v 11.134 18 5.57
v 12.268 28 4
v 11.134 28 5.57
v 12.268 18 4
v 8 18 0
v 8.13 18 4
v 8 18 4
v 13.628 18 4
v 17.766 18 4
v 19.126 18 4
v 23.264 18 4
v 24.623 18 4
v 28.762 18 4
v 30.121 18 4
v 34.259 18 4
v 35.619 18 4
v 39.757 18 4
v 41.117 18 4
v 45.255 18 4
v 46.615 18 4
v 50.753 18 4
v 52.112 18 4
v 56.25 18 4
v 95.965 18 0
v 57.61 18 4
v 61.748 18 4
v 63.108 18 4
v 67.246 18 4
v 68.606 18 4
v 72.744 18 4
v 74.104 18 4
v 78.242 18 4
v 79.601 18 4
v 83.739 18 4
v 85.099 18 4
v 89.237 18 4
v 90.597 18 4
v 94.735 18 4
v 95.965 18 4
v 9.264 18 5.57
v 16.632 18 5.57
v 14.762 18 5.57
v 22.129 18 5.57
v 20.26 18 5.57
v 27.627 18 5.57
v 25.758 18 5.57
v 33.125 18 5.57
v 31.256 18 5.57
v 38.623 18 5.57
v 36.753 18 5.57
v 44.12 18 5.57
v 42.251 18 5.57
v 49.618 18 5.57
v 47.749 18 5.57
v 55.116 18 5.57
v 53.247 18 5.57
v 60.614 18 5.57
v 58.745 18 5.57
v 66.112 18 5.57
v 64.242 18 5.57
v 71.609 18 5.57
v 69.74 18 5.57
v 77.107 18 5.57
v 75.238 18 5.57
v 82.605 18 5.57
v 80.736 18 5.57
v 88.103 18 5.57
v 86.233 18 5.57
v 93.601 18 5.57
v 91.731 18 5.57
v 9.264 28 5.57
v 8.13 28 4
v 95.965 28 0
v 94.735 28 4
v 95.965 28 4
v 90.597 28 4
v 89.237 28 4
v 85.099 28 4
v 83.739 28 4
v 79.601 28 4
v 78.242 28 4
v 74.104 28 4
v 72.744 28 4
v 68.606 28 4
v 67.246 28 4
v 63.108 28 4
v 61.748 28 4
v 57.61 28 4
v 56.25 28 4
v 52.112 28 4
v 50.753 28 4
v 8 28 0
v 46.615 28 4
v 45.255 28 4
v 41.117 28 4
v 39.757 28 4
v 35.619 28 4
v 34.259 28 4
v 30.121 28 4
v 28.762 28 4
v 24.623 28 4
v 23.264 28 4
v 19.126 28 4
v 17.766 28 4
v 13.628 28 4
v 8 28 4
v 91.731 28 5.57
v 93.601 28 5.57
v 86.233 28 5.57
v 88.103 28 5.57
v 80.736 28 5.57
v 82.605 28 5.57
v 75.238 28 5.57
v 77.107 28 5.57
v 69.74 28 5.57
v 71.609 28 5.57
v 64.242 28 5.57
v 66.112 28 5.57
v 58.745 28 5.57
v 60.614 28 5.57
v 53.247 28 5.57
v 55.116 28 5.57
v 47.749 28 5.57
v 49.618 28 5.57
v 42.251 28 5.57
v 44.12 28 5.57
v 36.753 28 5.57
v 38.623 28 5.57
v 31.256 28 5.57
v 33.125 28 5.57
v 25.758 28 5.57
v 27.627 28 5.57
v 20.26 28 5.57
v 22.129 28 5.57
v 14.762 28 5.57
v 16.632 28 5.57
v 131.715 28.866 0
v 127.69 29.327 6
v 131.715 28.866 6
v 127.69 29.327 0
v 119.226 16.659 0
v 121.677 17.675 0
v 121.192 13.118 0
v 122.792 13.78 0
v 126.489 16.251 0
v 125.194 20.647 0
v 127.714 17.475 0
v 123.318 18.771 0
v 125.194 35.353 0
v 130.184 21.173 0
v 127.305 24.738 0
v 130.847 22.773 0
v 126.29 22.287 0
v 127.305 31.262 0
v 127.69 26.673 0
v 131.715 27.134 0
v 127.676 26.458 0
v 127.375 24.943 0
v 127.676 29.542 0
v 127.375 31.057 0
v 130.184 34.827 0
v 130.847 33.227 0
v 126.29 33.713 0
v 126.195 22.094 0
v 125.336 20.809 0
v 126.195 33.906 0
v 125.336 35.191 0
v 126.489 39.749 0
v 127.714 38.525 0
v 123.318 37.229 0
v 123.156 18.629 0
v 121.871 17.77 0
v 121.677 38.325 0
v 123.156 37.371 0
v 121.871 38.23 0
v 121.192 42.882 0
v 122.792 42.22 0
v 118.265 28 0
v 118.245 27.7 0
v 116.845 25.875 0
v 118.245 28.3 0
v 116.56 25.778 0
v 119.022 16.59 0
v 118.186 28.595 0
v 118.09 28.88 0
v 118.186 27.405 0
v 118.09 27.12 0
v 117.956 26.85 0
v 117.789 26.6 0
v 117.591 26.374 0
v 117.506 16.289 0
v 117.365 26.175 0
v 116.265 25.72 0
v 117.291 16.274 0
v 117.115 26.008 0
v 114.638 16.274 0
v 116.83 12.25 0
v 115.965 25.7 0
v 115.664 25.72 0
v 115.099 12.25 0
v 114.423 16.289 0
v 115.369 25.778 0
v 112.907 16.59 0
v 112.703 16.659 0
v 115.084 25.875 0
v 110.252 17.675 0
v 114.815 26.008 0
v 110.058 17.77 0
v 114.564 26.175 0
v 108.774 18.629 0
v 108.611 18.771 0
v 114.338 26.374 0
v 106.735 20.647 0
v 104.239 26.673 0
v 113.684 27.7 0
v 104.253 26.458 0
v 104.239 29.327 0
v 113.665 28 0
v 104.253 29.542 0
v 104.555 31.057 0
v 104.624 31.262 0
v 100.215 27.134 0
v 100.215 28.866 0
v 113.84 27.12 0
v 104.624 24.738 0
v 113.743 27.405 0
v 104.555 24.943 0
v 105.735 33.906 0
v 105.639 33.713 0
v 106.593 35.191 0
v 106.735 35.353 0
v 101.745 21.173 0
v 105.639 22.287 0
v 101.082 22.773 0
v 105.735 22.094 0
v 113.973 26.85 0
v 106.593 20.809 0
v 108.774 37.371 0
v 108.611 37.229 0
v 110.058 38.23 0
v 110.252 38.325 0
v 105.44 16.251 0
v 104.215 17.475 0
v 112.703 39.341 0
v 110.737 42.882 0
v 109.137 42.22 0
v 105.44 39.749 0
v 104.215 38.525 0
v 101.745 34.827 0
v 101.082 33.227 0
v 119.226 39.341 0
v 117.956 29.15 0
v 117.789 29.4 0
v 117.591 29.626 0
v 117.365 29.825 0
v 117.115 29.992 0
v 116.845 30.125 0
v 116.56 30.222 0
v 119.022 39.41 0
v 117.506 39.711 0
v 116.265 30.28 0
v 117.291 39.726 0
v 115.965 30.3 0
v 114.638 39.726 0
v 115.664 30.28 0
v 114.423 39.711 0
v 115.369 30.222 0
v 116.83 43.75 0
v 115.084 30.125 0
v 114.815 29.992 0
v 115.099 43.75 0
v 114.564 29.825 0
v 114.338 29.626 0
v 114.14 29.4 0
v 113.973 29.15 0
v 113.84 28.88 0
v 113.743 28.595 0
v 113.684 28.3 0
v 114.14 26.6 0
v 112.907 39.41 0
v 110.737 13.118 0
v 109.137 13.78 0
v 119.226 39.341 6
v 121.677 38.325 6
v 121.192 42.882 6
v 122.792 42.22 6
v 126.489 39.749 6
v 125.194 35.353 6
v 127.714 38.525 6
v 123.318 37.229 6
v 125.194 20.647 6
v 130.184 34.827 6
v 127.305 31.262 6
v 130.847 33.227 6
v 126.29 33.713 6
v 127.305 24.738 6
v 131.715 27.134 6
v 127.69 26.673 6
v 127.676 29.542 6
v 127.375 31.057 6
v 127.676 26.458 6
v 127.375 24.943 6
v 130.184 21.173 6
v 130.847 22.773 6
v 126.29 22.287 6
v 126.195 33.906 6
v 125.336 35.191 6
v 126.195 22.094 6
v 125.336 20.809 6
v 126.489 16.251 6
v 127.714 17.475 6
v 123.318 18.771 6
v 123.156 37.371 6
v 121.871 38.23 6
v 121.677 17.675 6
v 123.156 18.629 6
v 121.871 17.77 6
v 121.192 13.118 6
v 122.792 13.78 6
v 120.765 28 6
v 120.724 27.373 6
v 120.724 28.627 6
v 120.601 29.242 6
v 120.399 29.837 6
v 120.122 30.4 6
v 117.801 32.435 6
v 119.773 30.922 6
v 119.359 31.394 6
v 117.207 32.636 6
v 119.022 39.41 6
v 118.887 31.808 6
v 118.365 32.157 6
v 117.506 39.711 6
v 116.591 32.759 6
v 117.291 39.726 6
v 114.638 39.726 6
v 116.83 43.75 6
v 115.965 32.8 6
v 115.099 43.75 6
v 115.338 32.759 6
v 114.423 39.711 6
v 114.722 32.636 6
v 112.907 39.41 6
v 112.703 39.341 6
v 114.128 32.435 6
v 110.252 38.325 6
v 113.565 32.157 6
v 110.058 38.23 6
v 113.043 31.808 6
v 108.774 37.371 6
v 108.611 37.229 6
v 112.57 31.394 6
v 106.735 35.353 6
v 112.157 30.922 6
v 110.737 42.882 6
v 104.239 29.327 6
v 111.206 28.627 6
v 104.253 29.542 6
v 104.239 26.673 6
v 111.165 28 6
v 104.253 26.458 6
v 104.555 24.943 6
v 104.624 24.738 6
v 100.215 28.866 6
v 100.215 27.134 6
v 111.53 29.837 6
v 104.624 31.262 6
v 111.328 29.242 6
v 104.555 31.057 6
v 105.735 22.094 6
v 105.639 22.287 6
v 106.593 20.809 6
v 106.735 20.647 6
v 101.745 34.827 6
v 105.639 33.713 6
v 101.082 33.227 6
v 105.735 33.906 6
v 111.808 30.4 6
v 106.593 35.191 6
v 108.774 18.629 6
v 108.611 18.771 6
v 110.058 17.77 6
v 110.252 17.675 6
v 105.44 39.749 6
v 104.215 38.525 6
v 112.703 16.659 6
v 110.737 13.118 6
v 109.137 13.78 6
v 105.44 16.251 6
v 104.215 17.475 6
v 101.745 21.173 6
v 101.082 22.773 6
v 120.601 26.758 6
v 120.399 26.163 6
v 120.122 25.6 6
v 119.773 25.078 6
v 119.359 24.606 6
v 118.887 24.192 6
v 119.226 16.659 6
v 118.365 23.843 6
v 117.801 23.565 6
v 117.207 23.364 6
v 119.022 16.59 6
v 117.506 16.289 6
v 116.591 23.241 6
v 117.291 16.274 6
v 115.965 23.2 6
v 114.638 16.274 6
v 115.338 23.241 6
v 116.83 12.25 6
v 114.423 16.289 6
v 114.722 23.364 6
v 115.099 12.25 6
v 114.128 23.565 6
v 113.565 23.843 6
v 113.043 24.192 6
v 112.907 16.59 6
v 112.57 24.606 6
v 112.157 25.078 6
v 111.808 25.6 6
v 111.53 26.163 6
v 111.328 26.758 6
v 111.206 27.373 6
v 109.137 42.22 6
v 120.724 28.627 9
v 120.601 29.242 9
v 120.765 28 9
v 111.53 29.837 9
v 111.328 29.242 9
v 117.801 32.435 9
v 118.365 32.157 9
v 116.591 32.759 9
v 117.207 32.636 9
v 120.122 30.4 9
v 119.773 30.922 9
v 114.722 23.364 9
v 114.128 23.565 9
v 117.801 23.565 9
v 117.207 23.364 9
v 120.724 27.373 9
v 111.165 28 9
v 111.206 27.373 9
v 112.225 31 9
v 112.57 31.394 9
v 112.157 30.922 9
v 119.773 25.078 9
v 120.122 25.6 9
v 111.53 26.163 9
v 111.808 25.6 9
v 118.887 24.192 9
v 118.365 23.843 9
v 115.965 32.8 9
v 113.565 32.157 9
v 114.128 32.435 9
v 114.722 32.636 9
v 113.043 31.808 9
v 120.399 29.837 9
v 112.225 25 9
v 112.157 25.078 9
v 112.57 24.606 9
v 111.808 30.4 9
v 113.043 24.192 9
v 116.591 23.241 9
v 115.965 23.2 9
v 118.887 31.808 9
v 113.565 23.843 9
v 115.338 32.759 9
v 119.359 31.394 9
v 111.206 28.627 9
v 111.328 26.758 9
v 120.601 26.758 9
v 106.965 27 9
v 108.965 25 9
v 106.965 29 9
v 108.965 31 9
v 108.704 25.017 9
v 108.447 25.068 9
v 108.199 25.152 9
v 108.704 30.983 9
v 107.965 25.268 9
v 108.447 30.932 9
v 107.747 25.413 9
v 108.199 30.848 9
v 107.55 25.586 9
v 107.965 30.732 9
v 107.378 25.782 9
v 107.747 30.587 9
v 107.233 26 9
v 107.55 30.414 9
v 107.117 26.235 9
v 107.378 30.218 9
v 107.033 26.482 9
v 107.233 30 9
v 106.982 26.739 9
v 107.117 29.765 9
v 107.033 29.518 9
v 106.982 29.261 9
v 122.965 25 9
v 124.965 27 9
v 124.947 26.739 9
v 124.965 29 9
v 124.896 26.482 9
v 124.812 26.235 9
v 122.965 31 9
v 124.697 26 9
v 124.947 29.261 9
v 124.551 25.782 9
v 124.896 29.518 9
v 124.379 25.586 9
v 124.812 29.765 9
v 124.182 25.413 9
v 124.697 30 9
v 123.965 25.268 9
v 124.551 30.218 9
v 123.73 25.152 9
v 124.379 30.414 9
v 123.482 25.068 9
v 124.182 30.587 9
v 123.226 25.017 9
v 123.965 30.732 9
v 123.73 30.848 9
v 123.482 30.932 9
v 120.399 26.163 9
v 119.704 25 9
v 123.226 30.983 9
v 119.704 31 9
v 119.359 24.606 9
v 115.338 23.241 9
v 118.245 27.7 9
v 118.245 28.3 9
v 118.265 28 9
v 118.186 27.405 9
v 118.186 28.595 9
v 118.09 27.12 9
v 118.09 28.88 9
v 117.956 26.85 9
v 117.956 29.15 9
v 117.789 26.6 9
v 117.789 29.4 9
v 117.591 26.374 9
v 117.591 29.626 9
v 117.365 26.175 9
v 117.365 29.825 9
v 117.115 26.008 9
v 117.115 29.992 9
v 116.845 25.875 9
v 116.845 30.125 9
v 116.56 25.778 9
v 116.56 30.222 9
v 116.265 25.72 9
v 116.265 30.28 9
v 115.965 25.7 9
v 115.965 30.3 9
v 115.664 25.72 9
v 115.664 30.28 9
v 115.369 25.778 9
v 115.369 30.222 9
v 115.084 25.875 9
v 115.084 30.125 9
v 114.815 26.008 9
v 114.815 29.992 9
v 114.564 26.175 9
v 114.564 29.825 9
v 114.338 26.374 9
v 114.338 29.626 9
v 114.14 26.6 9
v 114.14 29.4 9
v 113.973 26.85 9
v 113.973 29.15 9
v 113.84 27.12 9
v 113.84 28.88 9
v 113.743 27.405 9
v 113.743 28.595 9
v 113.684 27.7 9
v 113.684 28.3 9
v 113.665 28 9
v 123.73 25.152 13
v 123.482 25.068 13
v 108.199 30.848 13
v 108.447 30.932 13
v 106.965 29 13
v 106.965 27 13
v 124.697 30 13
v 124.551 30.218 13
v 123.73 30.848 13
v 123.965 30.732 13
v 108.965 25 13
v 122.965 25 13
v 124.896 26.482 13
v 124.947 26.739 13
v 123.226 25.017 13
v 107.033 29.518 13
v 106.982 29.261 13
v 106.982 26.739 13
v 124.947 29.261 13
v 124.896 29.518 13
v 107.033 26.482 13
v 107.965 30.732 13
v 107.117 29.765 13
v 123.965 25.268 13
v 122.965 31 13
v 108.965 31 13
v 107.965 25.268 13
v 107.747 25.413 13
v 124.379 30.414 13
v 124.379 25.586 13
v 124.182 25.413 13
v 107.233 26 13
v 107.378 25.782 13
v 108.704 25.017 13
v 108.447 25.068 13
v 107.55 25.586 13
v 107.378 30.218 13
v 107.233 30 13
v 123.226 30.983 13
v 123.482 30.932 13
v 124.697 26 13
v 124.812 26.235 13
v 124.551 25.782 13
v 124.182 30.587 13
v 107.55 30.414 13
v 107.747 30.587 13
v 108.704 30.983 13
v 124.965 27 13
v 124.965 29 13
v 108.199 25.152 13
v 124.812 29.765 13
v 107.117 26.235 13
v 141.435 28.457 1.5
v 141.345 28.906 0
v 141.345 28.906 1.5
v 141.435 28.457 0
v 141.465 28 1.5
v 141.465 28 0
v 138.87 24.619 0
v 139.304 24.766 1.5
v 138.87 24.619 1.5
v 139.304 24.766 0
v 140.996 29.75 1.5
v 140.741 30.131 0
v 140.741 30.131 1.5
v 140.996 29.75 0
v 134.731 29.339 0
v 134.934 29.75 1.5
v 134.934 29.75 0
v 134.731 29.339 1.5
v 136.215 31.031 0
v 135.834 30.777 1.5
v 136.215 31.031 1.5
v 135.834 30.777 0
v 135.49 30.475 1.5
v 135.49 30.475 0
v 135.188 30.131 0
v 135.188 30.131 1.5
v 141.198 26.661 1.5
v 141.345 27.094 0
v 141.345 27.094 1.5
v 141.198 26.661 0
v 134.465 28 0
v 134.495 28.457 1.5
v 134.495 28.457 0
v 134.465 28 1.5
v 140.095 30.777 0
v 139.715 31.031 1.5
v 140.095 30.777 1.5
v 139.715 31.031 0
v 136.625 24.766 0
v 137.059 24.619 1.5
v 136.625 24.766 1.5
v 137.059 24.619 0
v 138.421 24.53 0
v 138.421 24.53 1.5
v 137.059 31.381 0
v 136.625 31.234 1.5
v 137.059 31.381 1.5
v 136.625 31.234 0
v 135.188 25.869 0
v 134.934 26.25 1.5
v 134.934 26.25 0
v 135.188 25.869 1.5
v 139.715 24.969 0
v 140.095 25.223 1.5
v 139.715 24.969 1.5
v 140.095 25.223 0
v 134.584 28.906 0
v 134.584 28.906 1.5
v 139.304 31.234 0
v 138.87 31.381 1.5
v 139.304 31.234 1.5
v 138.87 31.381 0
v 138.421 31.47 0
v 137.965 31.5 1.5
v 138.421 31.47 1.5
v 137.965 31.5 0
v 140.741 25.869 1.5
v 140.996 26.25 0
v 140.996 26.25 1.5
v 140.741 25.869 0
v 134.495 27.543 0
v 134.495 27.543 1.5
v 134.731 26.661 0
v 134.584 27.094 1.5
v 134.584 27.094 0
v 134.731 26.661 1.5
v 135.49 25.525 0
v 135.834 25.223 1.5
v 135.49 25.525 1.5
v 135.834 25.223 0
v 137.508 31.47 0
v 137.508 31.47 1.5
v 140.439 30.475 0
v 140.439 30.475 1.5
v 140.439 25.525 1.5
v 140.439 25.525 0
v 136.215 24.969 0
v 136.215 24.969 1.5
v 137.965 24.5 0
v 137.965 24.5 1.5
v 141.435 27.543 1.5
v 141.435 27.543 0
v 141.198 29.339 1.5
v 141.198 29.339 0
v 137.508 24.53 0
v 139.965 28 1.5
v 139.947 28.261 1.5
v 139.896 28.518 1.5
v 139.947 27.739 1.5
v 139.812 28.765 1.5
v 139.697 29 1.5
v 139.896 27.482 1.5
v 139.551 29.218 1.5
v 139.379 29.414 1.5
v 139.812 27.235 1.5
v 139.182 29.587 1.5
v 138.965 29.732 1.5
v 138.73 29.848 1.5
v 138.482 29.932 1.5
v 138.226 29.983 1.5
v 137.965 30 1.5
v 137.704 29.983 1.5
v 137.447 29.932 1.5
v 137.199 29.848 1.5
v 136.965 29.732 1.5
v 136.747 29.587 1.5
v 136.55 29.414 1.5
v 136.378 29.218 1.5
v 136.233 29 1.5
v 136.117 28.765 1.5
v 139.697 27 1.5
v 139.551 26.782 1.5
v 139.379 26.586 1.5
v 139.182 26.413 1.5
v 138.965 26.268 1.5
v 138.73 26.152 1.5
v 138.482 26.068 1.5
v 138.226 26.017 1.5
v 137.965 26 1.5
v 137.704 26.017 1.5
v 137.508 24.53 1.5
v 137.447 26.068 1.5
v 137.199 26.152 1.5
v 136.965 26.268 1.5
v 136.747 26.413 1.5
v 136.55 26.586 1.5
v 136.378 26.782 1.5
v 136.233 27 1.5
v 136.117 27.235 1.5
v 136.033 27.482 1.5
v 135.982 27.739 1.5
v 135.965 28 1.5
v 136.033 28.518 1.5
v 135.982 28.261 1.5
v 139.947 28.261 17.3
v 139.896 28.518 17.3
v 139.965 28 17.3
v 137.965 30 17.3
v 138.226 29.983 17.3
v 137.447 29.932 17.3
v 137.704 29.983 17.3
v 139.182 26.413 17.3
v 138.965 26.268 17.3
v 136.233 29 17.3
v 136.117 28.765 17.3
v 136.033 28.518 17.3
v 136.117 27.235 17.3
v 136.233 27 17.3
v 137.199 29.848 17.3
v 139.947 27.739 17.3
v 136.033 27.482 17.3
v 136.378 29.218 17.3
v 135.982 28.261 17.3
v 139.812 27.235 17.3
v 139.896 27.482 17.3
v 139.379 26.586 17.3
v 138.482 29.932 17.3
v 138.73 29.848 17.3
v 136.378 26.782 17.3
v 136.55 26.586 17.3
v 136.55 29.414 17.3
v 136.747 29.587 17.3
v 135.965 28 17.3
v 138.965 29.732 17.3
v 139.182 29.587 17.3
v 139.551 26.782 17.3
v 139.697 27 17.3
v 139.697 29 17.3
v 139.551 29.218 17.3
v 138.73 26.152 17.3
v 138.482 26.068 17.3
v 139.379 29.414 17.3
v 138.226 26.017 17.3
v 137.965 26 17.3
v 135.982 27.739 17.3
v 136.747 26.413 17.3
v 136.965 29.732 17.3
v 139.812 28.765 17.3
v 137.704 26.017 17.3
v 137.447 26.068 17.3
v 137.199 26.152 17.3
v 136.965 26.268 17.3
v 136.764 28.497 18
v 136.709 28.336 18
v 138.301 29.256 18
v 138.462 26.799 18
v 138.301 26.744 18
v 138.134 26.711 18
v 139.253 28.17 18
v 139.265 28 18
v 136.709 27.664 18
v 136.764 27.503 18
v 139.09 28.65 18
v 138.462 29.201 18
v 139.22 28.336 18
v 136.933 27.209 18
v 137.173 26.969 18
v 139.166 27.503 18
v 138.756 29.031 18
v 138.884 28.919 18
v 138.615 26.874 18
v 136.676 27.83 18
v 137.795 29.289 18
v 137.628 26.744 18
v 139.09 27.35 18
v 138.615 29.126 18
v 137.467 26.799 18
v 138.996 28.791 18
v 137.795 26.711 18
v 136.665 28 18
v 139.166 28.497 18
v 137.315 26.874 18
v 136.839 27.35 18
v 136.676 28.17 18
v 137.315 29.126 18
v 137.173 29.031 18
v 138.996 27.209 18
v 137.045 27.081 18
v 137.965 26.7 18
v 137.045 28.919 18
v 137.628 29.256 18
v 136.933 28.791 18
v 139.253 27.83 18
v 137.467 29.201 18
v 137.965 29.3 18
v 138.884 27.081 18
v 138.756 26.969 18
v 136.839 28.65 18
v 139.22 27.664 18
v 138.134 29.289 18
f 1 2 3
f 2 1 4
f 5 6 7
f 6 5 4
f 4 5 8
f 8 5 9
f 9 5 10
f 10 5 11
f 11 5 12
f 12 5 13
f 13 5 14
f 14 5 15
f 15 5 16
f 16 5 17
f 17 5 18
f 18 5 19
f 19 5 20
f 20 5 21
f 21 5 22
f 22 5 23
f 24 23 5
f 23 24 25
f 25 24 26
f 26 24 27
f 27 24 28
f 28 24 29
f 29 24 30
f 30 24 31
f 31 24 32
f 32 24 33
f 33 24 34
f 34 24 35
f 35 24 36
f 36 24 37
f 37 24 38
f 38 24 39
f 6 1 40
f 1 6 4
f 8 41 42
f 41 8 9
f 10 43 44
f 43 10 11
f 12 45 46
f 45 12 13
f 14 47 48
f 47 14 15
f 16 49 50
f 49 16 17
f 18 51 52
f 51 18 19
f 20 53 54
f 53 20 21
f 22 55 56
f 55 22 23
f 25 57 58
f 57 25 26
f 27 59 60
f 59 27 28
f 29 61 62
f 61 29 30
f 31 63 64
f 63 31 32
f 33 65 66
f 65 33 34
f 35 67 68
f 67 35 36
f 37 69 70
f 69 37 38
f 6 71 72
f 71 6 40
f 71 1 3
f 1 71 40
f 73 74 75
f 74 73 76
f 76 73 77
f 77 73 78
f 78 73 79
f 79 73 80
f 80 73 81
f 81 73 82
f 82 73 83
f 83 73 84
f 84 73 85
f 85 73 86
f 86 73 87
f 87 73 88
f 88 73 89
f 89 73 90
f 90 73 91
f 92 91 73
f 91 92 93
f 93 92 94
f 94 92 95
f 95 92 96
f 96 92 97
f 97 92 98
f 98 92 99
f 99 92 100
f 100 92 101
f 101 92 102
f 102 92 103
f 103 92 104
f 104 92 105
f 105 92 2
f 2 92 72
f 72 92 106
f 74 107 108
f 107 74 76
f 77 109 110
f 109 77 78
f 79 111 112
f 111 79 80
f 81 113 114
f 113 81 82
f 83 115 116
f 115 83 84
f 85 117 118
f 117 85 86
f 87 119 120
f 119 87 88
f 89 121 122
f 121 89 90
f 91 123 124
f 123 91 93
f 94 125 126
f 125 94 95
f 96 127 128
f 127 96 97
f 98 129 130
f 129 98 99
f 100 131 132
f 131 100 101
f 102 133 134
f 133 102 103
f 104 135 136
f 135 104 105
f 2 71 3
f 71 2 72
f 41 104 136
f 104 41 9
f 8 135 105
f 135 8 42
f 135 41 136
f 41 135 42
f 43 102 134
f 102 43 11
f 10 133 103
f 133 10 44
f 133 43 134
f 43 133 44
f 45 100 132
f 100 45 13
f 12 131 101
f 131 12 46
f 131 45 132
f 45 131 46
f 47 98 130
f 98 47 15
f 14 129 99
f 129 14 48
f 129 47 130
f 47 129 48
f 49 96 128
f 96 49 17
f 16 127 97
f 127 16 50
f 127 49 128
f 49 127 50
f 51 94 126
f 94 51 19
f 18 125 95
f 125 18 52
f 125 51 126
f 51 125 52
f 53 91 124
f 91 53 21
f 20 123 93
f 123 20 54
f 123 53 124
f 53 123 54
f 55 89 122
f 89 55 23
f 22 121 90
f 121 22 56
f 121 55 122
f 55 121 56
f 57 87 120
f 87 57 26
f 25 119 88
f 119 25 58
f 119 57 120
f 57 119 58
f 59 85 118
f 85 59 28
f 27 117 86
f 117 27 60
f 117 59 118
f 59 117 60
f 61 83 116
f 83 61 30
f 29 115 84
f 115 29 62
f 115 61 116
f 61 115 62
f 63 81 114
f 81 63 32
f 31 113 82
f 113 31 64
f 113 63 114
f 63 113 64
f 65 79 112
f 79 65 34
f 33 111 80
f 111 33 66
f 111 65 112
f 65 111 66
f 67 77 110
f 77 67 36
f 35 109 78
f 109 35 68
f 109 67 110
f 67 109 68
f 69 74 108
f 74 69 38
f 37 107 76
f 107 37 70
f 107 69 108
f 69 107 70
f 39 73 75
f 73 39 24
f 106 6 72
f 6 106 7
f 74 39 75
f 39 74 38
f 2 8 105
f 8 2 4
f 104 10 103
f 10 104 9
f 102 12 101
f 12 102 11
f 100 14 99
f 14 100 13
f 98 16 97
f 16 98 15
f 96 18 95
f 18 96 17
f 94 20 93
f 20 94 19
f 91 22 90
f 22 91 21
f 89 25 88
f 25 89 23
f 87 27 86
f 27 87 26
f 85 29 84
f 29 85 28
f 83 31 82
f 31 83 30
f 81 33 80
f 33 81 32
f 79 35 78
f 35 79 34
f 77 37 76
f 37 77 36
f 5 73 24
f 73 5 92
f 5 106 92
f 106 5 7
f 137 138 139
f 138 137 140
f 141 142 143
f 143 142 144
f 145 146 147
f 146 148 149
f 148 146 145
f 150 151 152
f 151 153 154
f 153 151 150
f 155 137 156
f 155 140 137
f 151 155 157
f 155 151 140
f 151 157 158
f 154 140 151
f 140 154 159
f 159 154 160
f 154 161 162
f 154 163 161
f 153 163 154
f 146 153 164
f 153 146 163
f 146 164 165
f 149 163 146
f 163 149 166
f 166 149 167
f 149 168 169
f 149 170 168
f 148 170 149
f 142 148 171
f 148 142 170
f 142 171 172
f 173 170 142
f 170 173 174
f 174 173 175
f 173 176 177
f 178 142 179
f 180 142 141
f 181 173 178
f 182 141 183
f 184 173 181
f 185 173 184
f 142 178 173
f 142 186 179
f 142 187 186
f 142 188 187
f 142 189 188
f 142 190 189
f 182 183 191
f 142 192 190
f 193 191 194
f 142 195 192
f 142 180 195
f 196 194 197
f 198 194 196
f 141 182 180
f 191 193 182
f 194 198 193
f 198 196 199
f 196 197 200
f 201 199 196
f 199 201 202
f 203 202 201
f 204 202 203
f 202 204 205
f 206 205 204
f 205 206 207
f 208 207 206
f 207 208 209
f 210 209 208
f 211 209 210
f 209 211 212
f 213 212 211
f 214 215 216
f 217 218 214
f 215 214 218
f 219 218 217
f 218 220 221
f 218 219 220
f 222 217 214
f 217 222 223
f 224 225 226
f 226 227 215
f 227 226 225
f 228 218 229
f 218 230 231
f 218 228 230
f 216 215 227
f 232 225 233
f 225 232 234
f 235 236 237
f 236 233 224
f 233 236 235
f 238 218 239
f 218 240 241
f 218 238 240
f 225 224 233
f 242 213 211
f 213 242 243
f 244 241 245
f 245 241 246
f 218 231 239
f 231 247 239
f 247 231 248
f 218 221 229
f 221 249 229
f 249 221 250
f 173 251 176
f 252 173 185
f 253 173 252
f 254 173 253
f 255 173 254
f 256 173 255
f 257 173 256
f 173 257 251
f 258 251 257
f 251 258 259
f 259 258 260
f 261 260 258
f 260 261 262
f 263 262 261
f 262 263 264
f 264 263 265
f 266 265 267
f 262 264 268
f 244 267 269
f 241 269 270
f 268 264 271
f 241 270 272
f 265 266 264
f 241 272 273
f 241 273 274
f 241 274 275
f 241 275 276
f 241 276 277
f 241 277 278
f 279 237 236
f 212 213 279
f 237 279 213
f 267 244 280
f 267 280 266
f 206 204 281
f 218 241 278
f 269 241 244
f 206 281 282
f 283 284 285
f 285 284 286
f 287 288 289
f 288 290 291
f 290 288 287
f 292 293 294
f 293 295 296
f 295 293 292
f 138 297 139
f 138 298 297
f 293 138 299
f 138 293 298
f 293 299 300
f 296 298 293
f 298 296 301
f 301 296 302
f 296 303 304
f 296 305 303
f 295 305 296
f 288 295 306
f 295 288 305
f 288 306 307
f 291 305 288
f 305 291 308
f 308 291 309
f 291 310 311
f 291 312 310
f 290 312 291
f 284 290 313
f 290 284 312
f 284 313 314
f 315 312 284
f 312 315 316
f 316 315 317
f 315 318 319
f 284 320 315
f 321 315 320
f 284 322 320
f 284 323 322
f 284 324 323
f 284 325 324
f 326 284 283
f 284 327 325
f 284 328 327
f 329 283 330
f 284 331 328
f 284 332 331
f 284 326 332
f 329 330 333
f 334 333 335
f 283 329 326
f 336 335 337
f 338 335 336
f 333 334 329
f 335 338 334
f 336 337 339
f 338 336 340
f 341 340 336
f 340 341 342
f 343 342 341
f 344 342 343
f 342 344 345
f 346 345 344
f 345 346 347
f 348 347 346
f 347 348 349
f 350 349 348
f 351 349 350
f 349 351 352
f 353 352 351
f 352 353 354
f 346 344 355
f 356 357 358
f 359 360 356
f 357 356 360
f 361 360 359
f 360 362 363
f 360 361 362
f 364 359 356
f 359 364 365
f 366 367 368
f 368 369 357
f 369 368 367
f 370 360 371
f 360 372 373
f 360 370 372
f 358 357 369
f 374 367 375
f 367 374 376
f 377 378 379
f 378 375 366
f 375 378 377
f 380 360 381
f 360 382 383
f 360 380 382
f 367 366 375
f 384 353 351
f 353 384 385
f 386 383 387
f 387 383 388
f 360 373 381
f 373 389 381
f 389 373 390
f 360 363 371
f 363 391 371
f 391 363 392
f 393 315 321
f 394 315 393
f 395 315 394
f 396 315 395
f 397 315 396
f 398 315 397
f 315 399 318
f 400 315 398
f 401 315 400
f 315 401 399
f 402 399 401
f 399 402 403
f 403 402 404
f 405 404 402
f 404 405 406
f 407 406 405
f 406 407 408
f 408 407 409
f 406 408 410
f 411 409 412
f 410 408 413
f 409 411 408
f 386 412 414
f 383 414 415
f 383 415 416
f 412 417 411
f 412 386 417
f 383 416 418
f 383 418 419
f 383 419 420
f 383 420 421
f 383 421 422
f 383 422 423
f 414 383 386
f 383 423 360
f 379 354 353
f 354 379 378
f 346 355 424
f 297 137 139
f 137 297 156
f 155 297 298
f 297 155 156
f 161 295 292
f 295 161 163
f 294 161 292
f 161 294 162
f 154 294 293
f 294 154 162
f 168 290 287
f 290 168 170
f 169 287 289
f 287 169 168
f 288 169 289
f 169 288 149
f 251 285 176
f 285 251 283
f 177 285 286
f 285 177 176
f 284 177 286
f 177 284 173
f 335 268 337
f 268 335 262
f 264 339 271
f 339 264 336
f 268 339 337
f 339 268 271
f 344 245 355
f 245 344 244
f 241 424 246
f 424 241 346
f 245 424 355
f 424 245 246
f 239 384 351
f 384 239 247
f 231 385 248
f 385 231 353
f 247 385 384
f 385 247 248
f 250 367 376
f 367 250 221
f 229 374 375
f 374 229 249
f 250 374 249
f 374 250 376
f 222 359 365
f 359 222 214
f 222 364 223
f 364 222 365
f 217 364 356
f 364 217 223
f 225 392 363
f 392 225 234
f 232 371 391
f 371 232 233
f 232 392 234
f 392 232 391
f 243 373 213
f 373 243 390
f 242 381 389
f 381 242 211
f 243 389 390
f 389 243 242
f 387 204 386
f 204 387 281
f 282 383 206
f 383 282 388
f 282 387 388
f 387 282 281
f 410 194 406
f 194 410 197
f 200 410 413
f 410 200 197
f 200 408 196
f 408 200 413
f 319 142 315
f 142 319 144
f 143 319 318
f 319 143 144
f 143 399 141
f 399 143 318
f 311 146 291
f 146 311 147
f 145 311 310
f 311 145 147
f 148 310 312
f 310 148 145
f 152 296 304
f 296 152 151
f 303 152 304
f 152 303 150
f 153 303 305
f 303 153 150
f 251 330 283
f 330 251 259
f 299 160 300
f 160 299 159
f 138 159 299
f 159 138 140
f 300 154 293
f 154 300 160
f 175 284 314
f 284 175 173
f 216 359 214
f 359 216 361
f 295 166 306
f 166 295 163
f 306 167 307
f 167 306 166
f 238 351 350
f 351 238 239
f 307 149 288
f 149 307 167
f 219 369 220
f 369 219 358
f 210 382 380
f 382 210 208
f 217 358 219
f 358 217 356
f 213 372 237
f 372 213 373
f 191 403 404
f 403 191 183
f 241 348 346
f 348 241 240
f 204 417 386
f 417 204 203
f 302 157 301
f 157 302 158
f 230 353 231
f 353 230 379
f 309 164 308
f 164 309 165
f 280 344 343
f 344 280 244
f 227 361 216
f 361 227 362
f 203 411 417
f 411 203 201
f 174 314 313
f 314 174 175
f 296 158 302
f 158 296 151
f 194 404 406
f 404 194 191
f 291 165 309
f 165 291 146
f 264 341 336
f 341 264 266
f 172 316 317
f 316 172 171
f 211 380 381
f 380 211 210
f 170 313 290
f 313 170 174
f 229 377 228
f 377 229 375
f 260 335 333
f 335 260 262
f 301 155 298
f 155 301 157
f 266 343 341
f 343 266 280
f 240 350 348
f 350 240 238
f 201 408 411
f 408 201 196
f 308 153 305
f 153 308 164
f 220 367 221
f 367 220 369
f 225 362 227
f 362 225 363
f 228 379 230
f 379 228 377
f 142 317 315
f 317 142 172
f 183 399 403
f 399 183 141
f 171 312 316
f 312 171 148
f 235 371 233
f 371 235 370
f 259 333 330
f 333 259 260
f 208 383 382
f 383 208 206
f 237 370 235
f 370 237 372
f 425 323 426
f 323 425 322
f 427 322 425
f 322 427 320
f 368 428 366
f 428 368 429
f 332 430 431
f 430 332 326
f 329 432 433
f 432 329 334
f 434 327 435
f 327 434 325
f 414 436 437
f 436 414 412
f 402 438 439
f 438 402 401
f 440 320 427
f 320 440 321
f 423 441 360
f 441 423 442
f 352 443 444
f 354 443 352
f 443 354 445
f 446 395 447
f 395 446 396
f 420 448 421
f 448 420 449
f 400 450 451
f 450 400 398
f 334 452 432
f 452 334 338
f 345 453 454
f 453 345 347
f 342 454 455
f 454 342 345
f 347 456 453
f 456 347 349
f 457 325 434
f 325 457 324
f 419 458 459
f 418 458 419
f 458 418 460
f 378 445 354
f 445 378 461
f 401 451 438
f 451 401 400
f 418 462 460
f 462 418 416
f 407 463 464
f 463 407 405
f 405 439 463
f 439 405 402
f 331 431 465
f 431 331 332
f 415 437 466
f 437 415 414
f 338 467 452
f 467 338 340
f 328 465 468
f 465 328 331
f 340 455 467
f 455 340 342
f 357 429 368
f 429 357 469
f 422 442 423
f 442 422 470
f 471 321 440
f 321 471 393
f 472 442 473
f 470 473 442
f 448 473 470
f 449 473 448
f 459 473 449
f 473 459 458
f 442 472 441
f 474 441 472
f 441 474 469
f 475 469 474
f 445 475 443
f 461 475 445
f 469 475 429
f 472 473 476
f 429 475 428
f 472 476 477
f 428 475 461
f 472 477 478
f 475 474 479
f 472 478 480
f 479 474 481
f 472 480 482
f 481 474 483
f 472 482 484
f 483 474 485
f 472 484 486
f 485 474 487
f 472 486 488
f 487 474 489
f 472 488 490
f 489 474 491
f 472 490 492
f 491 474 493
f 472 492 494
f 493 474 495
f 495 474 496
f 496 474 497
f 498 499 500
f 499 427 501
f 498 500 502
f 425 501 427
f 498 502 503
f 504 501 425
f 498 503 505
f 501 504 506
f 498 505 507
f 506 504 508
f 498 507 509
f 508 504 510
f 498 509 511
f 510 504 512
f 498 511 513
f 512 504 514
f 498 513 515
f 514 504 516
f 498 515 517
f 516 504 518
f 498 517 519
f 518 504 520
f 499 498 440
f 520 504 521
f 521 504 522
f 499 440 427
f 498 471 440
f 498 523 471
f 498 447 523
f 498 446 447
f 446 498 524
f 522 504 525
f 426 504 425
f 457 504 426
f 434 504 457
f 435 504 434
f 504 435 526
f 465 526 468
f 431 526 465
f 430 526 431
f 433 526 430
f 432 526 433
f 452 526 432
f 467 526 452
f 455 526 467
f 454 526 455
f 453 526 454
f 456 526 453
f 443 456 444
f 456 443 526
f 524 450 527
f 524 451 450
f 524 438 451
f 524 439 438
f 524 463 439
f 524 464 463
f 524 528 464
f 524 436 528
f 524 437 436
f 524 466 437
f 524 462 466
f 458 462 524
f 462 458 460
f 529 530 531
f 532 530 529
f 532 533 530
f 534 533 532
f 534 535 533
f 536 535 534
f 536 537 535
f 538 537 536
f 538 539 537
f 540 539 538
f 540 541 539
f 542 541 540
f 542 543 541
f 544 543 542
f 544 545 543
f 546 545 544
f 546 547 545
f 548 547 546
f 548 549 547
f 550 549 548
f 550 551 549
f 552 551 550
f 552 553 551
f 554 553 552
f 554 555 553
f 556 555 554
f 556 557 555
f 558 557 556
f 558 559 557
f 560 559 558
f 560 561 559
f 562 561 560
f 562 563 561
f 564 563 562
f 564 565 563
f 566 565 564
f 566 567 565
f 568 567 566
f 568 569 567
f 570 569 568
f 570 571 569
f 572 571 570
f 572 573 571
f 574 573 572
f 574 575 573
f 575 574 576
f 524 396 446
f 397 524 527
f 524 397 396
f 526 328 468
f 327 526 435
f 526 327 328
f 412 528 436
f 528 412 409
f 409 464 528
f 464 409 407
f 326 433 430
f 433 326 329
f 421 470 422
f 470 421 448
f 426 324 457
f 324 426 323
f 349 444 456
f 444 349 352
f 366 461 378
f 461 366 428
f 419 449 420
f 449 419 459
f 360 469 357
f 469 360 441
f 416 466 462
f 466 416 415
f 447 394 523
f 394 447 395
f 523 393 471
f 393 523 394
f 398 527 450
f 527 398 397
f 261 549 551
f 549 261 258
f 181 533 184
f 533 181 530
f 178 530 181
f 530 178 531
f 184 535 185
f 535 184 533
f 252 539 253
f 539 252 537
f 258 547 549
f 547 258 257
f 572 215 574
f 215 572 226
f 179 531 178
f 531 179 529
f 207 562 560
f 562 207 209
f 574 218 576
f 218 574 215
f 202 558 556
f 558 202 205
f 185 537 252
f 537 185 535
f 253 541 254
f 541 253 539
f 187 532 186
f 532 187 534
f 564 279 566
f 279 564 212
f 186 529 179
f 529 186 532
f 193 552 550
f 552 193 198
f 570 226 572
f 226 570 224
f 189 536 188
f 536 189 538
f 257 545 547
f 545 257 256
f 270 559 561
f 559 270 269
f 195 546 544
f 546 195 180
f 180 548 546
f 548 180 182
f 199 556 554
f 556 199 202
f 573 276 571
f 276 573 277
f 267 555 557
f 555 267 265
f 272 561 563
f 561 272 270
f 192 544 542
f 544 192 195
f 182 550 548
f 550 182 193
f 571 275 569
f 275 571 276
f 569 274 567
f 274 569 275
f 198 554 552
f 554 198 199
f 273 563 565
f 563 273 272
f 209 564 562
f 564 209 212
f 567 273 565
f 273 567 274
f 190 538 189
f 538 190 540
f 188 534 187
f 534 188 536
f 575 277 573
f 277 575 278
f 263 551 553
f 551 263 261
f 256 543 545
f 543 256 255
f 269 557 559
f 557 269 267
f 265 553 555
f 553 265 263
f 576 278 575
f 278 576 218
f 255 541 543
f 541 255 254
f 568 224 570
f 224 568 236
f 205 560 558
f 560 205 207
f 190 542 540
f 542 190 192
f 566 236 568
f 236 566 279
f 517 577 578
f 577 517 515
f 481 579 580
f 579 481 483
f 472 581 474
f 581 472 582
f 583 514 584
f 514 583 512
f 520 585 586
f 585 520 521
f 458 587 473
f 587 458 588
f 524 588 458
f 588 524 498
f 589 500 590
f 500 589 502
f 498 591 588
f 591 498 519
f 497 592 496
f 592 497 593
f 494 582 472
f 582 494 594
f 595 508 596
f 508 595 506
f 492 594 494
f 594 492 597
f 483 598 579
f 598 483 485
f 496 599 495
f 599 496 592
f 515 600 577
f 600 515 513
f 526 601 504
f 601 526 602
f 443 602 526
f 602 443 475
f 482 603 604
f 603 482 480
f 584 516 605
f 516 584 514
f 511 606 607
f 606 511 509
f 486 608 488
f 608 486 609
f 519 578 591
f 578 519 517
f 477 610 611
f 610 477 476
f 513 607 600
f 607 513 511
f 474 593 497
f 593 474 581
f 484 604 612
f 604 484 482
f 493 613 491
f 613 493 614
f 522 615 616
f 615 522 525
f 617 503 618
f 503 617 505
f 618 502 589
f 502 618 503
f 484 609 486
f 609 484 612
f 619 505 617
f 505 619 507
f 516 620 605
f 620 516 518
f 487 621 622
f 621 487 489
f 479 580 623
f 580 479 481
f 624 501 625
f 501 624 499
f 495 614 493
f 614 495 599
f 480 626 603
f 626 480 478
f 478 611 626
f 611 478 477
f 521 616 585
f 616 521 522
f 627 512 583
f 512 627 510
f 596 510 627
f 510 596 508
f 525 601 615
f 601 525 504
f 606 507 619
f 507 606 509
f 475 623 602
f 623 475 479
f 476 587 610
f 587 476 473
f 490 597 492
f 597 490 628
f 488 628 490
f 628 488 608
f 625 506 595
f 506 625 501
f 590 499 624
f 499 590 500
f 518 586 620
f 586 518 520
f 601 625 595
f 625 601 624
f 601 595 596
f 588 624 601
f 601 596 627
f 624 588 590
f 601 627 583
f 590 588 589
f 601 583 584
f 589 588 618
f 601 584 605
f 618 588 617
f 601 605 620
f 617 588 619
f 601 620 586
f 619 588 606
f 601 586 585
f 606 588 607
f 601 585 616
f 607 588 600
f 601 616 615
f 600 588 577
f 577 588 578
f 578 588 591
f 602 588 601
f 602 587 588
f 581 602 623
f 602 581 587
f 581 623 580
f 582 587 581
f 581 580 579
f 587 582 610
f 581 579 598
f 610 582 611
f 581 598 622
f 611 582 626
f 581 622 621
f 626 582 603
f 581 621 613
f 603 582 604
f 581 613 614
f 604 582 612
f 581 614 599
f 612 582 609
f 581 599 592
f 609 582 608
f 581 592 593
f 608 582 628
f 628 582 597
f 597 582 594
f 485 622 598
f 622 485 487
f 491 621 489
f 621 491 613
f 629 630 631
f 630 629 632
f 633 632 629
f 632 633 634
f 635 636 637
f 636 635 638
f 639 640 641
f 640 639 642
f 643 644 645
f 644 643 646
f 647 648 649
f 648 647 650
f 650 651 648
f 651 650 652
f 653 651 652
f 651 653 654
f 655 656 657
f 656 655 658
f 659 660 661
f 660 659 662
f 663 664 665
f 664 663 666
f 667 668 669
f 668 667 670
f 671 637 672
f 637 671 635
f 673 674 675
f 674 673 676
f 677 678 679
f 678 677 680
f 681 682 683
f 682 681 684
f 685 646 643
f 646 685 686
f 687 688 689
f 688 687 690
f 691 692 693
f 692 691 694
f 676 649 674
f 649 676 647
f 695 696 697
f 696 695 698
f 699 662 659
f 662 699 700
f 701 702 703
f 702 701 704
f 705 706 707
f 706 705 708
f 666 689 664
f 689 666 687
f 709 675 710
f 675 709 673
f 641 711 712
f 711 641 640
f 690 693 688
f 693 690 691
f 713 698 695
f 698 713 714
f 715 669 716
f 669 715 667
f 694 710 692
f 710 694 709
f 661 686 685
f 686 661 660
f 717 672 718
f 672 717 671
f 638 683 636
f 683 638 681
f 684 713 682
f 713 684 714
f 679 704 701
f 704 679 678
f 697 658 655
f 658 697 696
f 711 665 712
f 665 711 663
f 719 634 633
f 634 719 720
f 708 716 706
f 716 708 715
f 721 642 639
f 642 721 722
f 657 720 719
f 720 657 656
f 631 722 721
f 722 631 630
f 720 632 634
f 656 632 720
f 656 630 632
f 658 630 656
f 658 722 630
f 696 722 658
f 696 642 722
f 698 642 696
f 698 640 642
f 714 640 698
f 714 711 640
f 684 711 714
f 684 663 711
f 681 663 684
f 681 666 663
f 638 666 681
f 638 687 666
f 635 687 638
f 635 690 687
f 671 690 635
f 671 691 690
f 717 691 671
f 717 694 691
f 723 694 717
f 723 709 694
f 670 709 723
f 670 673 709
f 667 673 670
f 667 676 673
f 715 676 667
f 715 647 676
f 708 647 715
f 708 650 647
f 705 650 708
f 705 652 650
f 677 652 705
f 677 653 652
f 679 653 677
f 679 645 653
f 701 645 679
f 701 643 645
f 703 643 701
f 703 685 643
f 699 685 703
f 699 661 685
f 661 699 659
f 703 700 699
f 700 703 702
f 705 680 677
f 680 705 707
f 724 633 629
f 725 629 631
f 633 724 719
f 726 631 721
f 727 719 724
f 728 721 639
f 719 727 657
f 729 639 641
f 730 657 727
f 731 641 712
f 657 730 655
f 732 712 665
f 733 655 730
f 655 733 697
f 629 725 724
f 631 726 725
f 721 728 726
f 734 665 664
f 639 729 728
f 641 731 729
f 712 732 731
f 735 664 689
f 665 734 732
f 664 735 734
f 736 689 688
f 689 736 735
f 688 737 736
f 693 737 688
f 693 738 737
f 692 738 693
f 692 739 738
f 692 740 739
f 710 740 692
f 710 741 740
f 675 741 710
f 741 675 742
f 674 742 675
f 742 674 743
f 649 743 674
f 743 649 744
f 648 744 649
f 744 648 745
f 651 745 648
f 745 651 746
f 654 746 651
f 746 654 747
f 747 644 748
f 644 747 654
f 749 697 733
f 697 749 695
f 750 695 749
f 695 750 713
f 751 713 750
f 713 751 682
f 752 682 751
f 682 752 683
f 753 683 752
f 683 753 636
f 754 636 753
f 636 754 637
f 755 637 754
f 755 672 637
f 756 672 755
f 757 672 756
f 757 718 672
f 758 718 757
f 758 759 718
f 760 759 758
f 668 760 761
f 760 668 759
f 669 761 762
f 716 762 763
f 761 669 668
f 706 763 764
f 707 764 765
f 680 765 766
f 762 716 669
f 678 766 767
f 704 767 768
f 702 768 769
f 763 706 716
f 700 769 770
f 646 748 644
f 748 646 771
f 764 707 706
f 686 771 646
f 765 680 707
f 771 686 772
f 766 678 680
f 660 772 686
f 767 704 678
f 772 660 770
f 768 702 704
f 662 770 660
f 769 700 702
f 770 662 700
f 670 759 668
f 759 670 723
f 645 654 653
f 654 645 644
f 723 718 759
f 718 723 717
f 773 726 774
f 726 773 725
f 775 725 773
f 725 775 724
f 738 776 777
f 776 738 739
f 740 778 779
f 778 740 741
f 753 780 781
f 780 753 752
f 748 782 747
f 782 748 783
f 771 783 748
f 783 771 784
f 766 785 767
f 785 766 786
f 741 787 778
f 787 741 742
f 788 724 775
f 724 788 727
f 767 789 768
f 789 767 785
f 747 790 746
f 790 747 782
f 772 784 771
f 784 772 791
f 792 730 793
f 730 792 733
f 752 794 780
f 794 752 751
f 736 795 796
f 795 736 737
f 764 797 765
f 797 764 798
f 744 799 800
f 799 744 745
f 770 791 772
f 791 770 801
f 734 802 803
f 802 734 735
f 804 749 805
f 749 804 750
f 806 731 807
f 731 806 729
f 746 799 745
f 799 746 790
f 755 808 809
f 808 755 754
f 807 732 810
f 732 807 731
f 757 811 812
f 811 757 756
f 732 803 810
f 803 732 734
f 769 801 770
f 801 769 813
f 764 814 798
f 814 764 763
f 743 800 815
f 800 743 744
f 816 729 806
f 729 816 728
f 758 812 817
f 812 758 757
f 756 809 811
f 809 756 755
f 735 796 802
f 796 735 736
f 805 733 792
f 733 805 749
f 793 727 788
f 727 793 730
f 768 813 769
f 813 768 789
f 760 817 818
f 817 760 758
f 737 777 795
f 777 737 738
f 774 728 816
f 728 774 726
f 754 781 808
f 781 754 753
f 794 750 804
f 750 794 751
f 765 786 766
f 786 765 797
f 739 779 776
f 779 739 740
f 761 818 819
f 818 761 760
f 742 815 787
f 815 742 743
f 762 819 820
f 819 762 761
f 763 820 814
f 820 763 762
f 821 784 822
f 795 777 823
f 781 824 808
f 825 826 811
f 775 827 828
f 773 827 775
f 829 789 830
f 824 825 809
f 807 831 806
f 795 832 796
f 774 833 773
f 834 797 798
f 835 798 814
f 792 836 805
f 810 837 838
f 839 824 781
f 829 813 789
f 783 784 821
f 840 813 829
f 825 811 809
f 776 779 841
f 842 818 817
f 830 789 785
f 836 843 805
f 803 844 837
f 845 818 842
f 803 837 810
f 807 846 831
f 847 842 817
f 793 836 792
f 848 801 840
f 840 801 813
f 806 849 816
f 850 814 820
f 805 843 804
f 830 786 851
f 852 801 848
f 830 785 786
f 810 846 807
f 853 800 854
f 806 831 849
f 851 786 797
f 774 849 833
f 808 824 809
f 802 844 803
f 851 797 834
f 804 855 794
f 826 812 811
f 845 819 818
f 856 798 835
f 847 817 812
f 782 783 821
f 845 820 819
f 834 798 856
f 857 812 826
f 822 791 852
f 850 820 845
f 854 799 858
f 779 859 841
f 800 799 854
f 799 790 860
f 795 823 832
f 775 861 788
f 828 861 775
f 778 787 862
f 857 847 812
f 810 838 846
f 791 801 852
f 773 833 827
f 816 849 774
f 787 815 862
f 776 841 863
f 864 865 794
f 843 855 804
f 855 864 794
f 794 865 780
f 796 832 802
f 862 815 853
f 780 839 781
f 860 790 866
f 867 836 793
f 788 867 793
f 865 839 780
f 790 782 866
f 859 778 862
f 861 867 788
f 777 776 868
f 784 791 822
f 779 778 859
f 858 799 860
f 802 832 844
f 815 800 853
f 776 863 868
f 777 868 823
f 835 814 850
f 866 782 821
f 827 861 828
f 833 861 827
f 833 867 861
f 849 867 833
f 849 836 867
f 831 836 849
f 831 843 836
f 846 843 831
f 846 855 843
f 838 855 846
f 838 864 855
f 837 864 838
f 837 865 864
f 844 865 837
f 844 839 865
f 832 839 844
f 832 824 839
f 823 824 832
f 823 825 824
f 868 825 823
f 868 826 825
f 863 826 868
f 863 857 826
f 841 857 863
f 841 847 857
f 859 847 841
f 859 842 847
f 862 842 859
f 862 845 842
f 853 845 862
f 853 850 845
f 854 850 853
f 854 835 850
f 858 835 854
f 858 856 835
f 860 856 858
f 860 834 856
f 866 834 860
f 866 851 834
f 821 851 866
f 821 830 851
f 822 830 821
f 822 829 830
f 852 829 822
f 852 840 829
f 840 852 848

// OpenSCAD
/*
Sample 099: Zahnstange und Ritzel — Modul 1,75
Generated from the FDM Mechanical Sample Library.
Units: millimetres.

Override examples:
  openscad -o custom.stl -D 'view="plate"' -D 'render_fn=64' model.scad
  openscad -o preview.png -D 'view="assembly"' model.scad
*/
use <../../../library/fdm_mechanisms.scad>

render_fn = is_undef(render_fn) ? 48 : render_fn;
view = is_undef(view) ? "plate" : view;
$fn = render_fn;

sample_rack_pinion(
    view=view,
    teeth=16,
    module_size=1.75,
    clearance=0.3
);
